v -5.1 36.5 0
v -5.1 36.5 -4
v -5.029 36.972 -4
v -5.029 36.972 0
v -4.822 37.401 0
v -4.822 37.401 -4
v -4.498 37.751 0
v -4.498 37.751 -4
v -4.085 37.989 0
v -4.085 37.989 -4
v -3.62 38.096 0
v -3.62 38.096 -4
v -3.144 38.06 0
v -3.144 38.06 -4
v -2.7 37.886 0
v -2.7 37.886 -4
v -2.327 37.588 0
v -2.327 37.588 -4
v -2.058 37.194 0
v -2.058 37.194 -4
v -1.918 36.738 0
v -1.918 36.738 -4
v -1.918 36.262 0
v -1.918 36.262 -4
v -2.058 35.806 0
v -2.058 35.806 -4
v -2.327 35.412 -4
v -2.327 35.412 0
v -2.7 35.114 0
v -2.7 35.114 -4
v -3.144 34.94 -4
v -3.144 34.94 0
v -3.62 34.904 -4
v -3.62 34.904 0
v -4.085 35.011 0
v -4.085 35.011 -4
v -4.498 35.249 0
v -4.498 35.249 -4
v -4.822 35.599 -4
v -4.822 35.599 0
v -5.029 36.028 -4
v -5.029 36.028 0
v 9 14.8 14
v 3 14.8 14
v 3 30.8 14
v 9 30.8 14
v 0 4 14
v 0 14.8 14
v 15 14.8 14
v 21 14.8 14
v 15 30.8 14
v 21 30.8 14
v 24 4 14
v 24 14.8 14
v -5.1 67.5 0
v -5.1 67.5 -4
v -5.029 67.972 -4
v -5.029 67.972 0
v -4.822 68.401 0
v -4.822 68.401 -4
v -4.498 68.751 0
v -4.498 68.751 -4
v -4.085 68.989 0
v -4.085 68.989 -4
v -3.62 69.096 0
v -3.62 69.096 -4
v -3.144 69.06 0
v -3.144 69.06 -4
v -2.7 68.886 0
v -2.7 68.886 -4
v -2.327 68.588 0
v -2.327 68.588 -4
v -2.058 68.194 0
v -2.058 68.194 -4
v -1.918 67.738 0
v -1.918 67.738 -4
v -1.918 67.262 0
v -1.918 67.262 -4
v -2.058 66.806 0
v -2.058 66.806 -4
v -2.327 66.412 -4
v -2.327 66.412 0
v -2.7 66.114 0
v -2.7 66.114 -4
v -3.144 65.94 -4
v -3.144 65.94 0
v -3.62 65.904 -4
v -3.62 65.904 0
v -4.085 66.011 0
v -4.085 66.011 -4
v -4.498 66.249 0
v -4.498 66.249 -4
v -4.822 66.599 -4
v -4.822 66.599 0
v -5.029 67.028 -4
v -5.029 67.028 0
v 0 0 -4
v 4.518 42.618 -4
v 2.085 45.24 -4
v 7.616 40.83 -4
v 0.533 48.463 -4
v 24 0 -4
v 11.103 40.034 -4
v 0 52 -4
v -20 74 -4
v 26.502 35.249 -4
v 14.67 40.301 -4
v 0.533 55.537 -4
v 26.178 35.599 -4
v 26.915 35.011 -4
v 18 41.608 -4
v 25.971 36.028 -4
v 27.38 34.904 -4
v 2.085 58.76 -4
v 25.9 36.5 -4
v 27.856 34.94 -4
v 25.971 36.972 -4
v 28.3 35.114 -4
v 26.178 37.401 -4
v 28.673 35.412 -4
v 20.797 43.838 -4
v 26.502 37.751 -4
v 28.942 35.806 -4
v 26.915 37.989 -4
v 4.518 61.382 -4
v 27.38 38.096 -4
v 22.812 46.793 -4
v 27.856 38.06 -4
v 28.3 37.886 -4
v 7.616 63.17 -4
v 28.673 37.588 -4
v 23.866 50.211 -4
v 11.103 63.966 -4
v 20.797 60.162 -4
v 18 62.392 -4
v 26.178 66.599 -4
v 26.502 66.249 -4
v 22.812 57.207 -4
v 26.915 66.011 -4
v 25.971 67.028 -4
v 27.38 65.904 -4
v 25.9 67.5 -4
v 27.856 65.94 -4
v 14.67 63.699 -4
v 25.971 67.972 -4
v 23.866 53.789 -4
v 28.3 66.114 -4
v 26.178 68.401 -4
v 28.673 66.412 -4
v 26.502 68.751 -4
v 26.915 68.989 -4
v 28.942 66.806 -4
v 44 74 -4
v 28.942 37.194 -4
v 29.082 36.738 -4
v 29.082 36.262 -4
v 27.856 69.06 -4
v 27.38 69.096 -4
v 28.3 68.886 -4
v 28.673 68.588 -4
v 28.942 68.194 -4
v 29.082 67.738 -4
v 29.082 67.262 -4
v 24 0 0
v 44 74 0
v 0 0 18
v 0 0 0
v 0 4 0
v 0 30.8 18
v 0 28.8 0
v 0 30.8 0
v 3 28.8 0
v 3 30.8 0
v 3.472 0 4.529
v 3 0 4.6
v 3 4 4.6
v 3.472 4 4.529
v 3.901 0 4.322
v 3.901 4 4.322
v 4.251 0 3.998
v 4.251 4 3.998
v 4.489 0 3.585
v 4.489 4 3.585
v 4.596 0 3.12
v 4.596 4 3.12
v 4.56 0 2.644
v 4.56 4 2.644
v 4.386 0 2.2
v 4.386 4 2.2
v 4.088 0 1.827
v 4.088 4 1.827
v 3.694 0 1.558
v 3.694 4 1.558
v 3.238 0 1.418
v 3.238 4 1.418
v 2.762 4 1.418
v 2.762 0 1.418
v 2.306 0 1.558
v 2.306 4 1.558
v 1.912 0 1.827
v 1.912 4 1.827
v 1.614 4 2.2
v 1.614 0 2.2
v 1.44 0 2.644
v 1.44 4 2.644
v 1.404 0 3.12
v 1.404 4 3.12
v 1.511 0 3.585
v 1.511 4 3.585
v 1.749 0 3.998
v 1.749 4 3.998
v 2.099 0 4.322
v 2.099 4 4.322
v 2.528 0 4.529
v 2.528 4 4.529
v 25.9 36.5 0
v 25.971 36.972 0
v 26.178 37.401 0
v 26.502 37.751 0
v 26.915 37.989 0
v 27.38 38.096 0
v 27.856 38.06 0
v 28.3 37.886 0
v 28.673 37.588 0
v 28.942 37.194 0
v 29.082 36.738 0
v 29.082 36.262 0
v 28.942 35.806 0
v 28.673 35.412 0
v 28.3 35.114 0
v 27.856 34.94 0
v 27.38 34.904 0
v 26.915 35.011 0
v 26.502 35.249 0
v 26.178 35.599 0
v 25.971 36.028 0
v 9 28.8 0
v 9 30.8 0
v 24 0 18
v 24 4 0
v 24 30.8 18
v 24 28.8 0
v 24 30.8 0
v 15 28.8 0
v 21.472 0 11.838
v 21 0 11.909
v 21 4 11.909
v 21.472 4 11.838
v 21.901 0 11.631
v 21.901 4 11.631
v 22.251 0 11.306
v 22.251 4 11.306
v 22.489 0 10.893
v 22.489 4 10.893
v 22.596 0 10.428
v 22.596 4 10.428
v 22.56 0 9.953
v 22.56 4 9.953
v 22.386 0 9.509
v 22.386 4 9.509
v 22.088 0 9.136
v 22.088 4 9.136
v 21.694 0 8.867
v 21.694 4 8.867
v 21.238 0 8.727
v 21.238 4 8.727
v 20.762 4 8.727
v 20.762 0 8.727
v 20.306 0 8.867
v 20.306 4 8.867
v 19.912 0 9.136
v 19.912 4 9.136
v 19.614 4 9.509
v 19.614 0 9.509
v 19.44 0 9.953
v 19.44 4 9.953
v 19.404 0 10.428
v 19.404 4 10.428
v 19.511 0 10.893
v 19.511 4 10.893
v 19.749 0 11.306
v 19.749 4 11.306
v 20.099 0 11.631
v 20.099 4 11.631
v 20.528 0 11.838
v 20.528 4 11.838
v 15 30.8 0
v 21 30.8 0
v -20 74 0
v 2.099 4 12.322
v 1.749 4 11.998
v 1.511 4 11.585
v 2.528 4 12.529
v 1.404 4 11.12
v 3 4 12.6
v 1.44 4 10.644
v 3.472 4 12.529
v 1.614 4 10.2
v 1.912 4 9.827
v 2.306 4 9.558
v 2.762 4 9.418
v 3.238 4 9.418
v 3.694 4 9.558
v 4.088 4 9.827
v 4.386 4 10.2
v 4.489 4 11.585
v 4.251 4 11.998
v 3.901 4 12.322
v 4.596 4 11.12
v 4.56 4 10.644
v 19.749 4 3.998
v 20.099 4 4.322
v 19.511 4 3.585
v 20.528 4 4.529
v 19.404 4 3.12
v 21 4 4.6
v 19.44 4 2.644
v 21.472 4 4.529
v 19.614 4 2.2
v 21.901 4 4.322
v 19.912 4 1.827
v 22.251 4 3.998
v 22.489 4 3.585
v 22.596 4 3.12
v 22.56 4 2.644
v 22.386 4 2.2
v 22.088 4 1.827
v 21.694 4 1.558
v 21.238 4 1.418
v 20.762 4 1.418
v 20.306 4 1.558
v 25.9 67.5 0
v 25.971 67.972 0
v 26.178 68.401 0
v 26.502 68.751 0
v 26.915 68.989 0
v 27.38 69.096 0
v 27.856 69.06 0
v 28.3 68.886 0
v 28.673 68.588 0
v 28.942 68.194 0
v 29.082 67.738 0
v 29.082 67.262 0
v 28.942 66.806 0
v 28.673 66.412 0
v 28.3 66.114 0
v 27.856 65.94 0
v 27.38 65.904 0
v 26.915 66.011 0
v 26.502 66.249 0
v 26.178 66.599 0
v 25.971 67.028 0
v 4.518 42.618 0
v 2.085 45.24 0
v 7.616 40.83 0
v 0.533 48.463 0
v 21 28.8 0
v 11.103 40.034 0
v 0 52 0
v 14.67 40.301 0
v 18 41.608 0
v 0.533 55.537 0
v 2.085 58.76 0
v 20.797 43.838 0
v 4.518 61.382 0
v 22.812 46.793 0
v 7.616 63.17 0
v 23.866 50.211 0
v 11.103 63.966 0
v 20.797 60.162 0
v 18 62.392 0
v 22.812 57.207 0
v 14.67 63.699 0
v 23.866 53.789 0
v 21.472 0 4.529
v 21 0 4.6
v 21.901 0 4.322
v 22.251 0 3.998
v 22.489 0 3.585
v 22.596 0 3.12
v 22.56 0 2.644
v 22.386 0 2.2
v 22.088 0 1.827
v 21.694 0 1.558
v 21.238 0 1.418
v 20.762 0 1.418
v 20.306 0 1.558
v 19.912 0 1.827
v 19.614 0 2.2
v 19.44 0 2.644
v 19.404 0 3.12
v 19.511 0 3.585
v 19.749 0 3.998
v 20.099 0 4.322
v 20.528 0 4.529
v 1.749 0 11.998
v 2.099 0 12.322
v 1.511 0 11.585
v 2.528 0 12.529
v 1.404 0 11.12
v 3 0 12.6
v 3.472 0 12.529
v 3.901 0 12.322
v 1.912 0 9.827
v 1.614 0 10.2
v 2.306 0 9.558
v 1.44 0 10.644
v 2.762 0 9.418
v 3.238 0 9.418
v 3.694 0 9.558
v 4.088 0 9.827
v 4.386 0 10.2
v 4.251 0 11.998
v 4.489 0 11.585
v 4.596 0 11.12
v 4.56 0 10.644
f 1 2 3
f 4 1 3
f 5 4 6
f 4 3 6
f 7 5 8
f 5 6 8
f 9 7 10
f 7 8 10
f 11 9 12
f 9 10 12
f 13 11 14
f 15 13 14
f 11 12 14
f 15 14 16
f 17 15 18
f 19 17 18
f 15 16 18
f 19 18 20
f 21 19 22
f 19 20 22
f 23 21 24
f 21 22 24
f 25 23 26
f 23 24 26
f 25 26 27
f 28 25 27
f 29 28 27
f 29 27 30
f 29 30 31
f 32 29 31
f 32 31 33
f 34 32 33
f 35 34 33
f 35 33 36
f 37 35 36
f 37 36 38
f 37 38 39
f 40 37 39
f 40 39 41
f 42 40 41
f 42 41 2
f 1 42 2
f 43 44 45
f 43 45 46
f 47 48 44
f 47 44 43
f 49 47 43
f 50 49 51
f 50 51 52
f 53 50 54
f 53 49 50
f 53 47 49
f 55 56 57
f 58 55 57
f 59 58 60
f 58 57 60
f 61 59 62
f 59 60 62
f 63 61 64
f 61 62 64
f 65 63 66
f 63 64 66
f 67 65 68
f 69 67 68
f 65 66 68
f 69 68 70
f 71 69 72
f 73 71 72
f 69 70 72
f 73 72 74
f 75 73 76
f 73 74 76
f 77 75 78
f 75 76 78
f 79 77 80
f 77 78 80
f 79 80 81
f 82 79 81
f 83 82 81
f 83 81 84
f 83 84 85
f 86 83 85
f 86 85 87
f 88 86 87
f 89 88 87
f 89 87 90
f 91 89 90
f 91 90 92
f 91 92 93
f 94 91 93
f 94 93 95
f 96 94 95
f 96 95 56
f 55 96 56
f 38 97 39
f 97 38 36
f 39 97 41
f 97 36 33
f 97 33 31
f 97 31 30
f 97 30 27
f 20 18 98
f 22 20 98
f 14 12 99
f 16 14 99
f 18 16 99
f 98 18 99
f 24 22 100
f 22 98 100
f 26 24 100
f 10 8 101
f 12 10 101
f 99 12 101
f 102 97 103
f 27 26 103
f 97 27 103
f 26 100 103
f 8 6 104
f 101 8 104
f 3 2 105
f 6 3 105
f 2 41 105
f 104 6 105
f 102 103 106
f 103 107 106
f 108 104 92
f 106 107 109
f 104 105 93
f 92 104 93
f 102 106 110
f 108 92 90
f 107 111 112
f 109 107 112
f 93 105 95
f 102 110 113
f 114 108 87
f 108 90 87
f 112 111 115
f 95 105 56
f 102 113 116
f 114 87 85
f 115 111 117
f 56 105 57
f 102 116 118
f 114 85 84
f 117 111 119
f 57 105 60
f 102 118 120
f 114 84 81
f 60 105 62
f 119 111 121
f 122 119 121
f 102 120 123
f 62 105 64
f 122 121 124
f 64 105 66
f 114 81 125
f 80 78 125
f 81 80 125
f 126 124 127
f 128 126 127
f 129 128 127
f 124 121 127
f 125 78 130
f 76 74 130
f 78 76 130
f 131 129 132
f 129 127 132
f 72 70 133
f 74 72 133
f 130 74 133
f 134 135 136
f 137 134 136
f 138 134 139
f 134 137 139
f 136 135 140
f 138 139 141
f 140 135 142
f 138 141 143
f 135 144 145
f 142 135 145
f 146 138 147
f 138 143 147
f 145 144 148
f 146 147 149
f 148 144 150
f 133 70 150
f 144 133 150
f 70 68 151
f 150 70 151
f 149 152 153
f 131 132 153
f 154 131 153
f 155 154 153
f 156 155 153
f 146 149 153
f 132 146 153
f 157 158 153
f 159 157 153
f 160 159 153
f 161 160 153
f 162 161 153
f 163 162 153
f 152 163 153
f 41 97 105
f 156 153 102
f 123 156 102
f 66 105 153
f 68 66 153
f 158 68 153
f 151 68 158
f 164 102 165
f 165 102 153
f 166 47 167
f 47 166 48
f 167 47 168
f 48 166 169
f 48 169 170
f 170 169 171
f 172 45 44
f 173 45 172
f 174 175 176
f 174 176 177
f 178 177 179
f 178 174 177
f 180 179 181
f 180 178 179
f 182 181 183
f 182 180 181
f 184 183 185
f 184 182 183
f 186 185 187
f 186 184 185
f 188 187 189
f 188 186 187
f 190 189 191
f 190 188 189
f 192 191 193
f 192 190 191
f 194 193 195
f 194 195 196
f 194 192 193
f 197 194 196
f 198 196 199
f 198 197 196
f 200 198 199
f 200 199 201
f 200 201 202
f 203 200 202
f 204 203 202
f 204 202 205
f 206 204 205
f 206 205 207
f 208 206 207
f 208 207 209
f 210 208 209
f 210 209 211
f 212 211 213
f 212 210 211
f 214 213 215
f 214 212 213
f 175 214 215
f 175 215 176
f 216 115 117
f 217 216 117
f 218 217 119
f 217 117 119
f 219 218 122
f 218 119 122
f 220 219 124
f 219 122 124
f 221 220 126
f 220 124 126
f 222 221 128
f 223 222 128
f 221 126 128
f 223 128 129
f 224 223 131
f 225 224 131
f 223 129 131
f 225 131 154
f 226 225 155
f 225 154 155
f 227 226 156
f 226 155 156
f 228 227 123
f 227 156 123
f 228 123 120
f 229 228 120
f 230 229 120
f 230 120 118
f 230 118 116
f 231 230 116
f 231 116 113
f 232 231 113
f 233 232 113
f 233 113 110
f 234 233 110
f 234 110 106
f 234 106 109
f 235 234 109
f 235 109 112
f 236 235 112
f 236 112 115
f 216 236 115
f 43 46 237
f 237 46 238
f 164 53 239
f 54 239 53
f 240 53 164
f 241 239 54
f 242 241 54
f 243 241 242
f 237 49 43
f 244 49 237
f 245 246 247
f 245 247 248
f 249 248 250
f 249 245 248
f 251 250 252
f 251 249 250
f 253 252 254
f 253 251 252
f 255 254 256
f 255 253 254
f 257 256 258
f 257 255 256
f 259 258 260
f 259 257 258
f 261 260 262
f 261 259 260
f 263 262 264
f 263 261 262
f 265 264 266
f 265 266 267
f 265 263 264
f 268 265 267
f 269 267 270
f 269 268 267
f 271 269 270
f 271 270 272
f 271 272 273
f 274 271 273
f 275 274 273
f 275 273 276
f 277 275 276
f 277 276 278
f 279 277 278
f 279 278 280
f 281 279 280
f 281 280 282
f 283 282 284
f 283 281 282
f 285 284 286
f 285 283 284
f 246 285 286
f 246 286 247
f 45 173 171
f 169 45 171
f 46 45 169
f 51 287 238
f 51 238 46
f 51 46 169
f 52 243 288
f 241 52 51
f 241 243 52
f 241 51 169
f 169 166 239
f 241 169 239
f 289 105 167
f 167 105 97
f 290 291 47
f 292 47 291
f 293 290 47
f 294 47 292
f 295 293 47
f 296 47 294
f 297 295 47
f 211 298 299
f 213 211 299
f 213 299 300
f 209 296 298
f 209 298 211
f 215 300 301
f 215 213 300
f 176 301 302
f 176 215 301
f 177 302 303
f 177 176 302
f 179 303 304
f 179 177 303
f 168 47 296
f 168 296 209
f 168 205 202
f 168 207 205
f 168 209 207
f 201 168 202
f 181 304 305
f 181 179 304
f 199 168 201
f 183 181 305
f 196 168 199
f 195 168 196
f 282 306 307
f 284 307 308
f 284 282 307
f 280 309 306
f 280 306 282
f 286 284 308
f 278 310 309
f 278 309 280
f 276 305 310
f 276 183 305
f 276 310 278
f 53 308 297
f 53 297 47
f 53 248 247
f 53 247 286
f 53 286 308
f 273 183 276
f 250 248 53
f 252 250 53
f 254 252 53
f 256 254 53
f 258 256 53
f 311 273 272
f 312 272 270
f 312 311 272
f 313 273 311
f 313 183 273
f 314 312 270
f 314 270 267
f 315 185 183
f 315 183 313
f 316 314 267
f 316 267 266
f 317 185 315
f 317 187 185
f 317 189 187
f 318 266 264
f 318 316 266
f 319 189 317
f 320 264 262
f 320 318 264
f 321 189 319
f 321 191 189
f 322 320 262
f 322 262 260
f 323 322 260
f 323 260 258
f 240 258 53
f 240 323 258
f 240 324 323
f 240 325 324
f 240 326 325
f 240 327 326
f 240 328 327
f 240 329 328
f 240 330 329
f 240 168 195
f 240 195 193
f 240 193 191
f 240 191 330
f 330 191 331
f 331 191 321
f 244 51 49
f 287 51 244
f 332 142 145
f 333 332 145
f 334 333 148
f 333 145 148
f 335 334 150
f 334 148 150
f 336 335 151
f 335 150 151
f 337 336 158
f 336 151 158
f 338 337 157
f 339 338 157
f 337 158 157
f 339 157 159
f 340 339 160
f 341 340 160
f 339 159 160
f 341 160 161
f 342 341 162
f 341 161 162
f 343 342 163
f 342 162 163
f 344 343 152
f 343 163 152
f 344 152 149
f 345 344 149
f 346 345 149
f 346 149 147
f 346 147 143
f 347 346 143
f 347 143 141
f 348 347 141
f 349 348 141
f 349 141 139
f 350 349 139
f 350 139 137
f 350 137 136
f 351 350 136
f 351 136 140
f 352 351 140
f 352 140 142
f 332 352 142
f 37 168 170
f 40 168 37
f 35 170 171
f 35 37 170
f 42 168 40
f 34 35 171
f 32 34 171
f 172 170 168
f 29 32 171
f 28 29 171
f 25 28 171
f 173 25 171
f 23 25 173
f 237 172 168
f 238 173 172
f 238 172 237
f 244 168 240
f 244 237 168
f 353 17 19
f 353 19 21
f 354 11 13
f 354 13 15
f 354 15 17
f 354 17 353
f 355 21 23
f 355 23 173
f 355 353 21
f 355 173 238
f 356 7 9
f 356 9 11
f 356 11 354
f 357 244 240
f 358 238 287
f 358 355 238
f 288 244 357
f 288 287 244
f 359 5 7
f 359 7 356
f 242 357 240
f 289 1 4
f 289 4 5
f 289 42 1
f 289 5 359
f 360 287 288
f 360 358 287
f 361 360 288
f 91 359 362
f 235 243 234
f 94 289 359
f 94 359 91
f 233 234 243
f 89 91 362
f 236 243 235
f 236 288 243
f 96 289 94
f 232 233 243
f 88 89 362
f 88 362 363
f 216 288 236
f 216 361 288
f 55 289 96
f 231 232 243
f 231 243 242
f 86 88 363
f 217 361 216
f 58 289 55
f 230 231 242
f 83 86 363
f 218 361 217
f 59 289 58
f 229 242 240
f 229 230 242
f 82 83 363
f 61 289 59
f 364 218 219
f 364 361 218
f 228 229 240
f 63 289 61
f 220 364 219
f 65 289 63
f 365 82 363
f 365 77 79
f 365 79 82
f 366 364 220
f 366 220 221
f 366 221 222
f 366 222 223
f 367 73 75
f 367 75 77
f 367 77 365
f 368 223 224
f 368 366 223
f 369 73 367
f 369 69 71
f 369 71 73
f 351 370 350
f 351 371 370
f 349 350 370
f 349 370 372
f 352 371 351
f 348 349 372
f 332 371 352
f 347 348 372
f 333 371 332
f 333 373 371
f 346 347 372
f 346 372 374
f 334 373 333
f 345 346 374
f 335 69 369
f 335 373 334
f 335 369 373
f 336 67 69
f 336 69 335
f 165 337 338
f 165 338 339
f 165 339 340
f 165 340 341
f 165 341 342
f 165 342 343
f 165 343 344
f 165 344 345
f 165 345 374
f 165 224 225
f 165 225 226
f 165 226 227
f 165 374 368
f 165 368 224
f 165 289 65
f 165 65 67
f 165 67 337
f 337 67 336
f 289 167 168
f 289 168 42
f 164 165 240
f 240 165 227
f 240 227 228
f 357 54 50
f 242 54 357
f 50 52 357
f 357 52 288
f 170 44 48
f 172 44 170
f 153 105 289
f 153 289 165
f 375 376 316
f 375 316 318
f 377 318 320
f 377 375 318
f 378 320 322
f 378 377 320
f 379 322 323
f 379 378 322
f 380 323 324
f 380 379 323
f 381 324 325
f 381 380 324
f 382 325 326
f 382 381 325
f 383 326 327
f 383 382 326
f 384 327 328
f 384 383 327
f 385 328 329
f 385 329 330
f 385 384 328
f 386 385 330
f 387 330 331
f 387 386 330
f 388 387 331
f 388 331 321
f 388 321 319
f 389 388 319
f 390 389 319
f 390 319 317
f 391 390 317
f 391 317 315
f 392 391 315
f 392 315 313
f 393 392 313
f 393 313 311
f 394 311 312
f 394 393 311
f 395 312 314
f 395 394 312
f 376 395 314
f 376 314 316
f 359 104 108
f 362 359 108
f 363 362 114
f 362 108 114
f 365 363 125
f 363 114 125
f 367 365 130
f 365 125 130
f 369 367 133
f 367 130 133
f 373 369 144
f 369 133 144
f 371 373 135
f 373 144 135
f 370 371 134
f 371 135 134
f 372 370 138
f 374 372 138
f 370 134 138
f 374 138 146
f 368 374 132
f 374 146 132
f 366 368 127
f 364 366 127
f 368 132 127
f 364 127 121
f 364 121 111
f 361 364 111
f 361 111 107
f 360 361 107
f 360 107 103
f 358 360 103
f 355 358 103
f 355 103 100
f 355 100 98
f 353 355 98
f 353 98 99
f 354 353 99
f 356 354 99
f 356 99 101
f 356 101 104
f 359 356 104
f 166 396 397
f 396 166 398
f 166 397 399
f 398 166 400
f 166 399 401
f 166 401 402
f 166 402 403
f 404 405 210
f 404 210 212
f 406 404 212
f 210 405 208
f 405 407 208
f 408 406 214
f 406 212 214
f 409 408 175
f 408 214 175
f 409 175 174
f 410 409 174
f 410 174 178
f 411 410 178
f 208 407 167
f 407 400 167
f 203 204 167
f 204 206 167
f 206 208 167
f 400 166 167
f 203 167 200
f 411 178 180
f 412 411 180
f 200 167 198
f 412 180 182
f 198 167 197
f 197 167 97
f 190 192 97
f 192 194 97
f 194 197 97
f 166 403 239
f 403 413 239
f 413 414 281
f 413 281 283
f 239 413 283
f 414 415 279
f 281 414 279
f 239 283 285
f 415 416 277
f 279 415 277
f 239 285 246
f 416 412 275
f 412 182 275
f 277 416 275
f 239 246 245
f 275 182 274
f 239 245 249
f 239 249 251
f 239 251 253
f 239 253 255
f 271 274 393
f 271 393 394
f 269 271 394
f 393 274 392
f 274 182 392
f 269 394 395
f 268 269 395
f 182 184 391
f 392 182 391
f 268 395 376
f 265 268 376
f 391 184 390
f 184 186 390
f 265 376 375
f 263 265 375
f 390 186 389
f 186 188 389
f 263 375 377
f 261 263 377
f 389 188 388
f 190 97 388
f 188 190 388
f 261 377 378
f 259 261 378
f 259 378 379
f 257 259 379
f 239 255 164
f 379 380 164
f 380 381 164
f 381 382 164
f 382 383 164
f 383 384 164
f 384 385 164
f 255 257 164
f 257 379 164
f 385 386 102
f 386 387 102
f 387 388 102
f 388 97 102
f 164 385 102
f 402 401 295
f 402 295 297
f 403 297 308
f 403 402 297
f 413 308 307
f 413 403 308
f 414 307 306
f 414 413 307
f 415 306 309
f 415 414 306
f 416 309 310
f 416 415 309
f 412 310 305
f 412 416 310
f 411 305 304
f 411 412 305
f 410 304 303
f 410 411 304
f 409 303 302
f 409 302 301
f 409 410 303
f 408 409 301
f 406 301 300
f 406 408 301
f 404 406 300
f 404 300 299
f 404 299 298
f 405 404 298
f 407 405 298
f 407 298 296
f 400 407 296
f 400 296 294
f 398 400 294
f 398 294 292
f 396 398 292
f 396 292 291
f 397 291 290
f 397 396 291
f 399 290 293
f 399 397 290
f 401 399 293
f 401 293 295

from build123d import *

# Parameters (mm, degrees)
SKETCH_1_W               = 24
SKETCH_1_H               = 14
SKETCH_1_R               = 1.6
EXTRUDE_1_DEPTH          = 4
SKETCH_3_W               = 24
SKETCH_3_H               = 4
EXTRUDE_2_DEPTH          = 4
SKETCH_5_W               = 24
SKETCH_5_H               = 4
EXTRUDE_3_DEPTH          = 70
SKETCH_8_W               = 24
SKETCH_8_H               = 4
EXTRUDE_4_DEPTH          = 4
SKETCH_9_W               = 24
SKETCH_9_H               = 4
EXTRUDE_5_DEPTH          = 70
EXTRUDE_7_DEPTH          = 4
SKETCH_14_W              = 24
SKETCH_14_H              = 4
CUT_EXTRUDE_2_DEPTH      = 43.2
EXTRUDE_8_DEPTH          = 24
CUT_EXTRUDE_3_DEPTH      = 3
CUT_EXTRUDE_3_DEPTH_BACK = 3
CUT_EXTRUDE_4_DEPTH      = 3
CUT_EXTRUDE_4_DEPTH_BACK = 3
CUT_EXTRUDE_6_REACH      = 90.859
SKETCH_11_R              = 12
SKETCH_11_R_2            = 1.6


with BuildPart() as part:
    # 草图1 → 凸台-拉伸1 (new body)
    with BuildSketch(Plane(origin=(0, 0, 0), x_dir=(1, 0, 0), z_dir=(0, 1, 0))):
        with Locations((12, -7)):
            Rectangle(SKETCH_1_W, SKETCH_1_H)
        with Locations(Location((3, -3, 0), (0, 0, 270))):
            Circle(SKETCH_1_R, mode=Mode.SUBTRACT)
        with Locations(Location((3.000002263, -11, 0), (0, 0, 270))):
            Circle(SKETCH_1_R, mode=Mode.SUBTRACT)
        with Locations(Location((21, -3, 0), (0, 0, 270))):
            Circle(SKETCH_1_R, mode=Mode.SUBTRACT)
        with Locations(Location((21.000002263, -10.308630824, 0), (0, 0, 270))):
            Circle(SKETCH_1_R, mode=Mode.SUBTRACT)
    extrude(amount=EXTRUDE_1_DEPTH)

    # 草图3 → 凸台-拉伸2 (add)
    with BuildSketch(Plane(origin=(0, 0, 0), x_dir=(-1, 0, 0), z_dir=(0, 0, -1))):
        with Locations((-12, 2)):
            Rectangle(SKETCH_3_W, SKETCH_3_H)
    extrude(amount=EXTRUDE_2_DEPTH)

    # 草图5 → 凸台-拉伸3 (add)
    with BuildSketch(Plane(origin=(0, 4, 0), x_dir=(1, 0, 0), z_dir=(0, 1, 0))):
        with Locations((12, 2)):
            Rectangle(SKETCH_5_W, SKETCH_5_H)
    extrude(amount=EXTRUDE_3_DEPTH)

    # 草图8 → 凸台-拉伸4 (add)
    with BuildSketch(Plane.XY.offset(14)):
        with Locations((12, 2)):
            Rectangle(SKETCH_8_W, SKETCH_8_H)
    extrude(amount=EXTRUDE_4_DEPTH)

    # 草图9 → 凸台-拉伸5 (add)
    with BuildSketch(Plane(origin=(0, 4, 0), x_dir=(1, 0, 0), z_dir=(0, 1, 0))):
        with Locations((12, -16)):
            Rectangle(SKETCH_9_W, SKETCH_9_H)
    extrude(amount=EXTRUDE_5_DEPTH)

    # 草图10 → 凸台-拉伸7 (add)
    with BuildSketch(Plane(origin=(0, 0, -4), x_dir=(-1, 0, 0), z_dir=(0, 0, -1))):
        Polygon((-24, 74), (0, 74), (20, 74), (0, 0), (-24, 0), (-44, 74), align=None)
    extrude(amount=-EXTRUDE_7_DEPTH)

    # 草图14 → 切除-拉伸2 (cut)
    with BuildSketch(Plane(origin=(0, 74, 0), x_dir=(1, 0, 0), z_dir=(0, 1, 0))):
        with Locations((12, -16)):
            Rectangle(SKETCH_14_W, SKETCH_14_H)
    extrude(amount=-CUT_EXTRUDE_2_DEPTH, mode=Mode.SUBTRACT)

    # 草图17 → 凸台-拉伸8 (add)
    with BuildSketch(Plane(origin=(24, 0, 0), x_dir=(0, 0, -1), z_dir=(1, 0, 0))):
        Polygon((-14, 30.8), (-14, 14.8), (0, 28.8), (0, 30.8), align=None)
    extrude(amount=-EXTRUDE_8_DEPTH)

    # 草图20 → 切除-拉伸3 (cut, two sides: drawn at the far end of the back side and taken through both)
    with BuildSketch(Plane.ZY.offset(-6).offset(-CUT_EXTRUDE_3_DEPTH_BACK)):
        Polygon((14, 30.8), (14, 14.8), (0, 28.8), (0, 30.8), align=None)
    extrude(amount=CUT_EXTRUDE_3_DEPTH + CUT_EXTRUDE_3_DEPTH_BACK, mode=Mode.SUBTRACT)

    # 草图21 → 切除-拉伸4 (cut, two sides: drawn at the far end of the back side and taken through both)
    with BuildSketch(Plane.ZY.offset(-18).offset(-CUT_EXTRUDE_4_DEPTH_BACK)):
        Polygon((14, 30.8), (14, 14.8), (0, 28.8), (0, 30.8), align=None)
    extrude(amount=CUT_EXTRUDE_4_DEPTH + CUT_EXTRUDE_4_DEPTH_BACK, mode=Mode.SUBTRACT)

    # 草图11 → 切除-拉伸6 (cut, up to next)
    with BuildSketch(Plane(origin=(0, 0, -4), x_dir=(-1, 0, 0), z_dir=(0, 0, -1)), mode=Mode.PRIVATE) as cut_extrude_6_sk1:
        with Locations((-12, 52)):
            Circle(SKETCH_11_R)
    cut_extrude_6_tool1 = extrude(cut_extrude_6_sk1.sketch, amount=-CUT_EXTRUDE_6_REACH, mode=Mode.PRIVATE) & part.part
    # 草图11 → 切除-拉伸6 (cut, up to next)
    with BuildSketch(Plane(origin=(0, 0, -4), x_dir=(-1, 0, 0), z_dir=(0, 0, -1)), mode=Mode.PRIVATE) as cut_extrude_6_sk2:
        with Locations((-27.5, 67.5)):
            Circle(SKETCH_11_R_2)
    cut_extrude_6_tool2 = extrude(cut_extrude_6_sk2.sketch, amount=-CUT_EXTRUDE_6_REACH, mode=Mode.PRIVATE) & part.part
    # 草图11 → 切除-拉伸6 (cut, up to next)
    with BuildSketch(Plane(origin=(0, 0, -4), x_dir=(-1, 0, 0), z_dir=(0, 0, -1)), mode=Mode.PRIVATE) as cut_extrude_6_sk3:
        with Locations((3.5, 67.5)):
            Circle(SKETCH_11_R_2)
    cut_extrude_6_tool3 = extrude(cut_extrude_6_sk3.sketch, amount=-CUT_EXTRUDE_6_REACH, mode=Mode.PRIVATE) & part.part
    # 草图11 → 切除-拉伸6 (cut, up to next)
    with BuildSketch(Plane(origin=(0, 0, -4), x_dir=(-1, 0, 0), z_dir=(0, 0, -1)), mode=Mode.PRIVATE) as cut_extrude_6_sk4:
        with Locations((3.5, 36.5)):
            Circle(SKETCH_11_R_2)
    cut_extrude_6_tool4 = extrude(cut_extrude_6_sk4.sketch, amount=-CUT_EXTRUDE_6_REACH, mode=Mode.PRIVATE) & part.part
    # 草图11 → 切除-拉伸6 (cut, up to next)
    with BuildSketch(Plane(origin=(0, 0, -4), x_dir=(-1, 0, 0), z_dir=(0, 0, -1)), mode=Mode.PRIVATE) as cut_extrude_6_sk5:
        with Locations((-27.5, 36.5)):
            Circle(SKETCH_11_R_2)
    cut_extrude_6_tool5 = extrude(cut_extrude_6_sk5.sketch, amount=-CUT_EXTRUDE_6_REACH, mode=Mode.PRIVATE) & part.part
    add(cut_extrude_6_tool1.solids().sort_by_distance((12, 52, -4))[0], mode=Mode.SUBTRACT)
    add(cut_extrude_6_tool2.solids().sort_by_distance((27.5, 67.5, -4))[0], mode=Mode.SUBTRACT)
    add(cut_extrude_6_tool3.solids().sort_by_distance((-3.5, 67.5, -4))[0], mode=Mode.SUBTRACT)
    add(cut_extrude_6_tool4.solids().sort_by_distance((-3.5, 36.5, -4))[0], mode=Mode.SUBTRACT)
    add(cut_extrude_6_tool5.solids().sort_by_distance((27.5, 36.5, -4))[0], mode=Mode.SUBTRACT)


solid = part.part
